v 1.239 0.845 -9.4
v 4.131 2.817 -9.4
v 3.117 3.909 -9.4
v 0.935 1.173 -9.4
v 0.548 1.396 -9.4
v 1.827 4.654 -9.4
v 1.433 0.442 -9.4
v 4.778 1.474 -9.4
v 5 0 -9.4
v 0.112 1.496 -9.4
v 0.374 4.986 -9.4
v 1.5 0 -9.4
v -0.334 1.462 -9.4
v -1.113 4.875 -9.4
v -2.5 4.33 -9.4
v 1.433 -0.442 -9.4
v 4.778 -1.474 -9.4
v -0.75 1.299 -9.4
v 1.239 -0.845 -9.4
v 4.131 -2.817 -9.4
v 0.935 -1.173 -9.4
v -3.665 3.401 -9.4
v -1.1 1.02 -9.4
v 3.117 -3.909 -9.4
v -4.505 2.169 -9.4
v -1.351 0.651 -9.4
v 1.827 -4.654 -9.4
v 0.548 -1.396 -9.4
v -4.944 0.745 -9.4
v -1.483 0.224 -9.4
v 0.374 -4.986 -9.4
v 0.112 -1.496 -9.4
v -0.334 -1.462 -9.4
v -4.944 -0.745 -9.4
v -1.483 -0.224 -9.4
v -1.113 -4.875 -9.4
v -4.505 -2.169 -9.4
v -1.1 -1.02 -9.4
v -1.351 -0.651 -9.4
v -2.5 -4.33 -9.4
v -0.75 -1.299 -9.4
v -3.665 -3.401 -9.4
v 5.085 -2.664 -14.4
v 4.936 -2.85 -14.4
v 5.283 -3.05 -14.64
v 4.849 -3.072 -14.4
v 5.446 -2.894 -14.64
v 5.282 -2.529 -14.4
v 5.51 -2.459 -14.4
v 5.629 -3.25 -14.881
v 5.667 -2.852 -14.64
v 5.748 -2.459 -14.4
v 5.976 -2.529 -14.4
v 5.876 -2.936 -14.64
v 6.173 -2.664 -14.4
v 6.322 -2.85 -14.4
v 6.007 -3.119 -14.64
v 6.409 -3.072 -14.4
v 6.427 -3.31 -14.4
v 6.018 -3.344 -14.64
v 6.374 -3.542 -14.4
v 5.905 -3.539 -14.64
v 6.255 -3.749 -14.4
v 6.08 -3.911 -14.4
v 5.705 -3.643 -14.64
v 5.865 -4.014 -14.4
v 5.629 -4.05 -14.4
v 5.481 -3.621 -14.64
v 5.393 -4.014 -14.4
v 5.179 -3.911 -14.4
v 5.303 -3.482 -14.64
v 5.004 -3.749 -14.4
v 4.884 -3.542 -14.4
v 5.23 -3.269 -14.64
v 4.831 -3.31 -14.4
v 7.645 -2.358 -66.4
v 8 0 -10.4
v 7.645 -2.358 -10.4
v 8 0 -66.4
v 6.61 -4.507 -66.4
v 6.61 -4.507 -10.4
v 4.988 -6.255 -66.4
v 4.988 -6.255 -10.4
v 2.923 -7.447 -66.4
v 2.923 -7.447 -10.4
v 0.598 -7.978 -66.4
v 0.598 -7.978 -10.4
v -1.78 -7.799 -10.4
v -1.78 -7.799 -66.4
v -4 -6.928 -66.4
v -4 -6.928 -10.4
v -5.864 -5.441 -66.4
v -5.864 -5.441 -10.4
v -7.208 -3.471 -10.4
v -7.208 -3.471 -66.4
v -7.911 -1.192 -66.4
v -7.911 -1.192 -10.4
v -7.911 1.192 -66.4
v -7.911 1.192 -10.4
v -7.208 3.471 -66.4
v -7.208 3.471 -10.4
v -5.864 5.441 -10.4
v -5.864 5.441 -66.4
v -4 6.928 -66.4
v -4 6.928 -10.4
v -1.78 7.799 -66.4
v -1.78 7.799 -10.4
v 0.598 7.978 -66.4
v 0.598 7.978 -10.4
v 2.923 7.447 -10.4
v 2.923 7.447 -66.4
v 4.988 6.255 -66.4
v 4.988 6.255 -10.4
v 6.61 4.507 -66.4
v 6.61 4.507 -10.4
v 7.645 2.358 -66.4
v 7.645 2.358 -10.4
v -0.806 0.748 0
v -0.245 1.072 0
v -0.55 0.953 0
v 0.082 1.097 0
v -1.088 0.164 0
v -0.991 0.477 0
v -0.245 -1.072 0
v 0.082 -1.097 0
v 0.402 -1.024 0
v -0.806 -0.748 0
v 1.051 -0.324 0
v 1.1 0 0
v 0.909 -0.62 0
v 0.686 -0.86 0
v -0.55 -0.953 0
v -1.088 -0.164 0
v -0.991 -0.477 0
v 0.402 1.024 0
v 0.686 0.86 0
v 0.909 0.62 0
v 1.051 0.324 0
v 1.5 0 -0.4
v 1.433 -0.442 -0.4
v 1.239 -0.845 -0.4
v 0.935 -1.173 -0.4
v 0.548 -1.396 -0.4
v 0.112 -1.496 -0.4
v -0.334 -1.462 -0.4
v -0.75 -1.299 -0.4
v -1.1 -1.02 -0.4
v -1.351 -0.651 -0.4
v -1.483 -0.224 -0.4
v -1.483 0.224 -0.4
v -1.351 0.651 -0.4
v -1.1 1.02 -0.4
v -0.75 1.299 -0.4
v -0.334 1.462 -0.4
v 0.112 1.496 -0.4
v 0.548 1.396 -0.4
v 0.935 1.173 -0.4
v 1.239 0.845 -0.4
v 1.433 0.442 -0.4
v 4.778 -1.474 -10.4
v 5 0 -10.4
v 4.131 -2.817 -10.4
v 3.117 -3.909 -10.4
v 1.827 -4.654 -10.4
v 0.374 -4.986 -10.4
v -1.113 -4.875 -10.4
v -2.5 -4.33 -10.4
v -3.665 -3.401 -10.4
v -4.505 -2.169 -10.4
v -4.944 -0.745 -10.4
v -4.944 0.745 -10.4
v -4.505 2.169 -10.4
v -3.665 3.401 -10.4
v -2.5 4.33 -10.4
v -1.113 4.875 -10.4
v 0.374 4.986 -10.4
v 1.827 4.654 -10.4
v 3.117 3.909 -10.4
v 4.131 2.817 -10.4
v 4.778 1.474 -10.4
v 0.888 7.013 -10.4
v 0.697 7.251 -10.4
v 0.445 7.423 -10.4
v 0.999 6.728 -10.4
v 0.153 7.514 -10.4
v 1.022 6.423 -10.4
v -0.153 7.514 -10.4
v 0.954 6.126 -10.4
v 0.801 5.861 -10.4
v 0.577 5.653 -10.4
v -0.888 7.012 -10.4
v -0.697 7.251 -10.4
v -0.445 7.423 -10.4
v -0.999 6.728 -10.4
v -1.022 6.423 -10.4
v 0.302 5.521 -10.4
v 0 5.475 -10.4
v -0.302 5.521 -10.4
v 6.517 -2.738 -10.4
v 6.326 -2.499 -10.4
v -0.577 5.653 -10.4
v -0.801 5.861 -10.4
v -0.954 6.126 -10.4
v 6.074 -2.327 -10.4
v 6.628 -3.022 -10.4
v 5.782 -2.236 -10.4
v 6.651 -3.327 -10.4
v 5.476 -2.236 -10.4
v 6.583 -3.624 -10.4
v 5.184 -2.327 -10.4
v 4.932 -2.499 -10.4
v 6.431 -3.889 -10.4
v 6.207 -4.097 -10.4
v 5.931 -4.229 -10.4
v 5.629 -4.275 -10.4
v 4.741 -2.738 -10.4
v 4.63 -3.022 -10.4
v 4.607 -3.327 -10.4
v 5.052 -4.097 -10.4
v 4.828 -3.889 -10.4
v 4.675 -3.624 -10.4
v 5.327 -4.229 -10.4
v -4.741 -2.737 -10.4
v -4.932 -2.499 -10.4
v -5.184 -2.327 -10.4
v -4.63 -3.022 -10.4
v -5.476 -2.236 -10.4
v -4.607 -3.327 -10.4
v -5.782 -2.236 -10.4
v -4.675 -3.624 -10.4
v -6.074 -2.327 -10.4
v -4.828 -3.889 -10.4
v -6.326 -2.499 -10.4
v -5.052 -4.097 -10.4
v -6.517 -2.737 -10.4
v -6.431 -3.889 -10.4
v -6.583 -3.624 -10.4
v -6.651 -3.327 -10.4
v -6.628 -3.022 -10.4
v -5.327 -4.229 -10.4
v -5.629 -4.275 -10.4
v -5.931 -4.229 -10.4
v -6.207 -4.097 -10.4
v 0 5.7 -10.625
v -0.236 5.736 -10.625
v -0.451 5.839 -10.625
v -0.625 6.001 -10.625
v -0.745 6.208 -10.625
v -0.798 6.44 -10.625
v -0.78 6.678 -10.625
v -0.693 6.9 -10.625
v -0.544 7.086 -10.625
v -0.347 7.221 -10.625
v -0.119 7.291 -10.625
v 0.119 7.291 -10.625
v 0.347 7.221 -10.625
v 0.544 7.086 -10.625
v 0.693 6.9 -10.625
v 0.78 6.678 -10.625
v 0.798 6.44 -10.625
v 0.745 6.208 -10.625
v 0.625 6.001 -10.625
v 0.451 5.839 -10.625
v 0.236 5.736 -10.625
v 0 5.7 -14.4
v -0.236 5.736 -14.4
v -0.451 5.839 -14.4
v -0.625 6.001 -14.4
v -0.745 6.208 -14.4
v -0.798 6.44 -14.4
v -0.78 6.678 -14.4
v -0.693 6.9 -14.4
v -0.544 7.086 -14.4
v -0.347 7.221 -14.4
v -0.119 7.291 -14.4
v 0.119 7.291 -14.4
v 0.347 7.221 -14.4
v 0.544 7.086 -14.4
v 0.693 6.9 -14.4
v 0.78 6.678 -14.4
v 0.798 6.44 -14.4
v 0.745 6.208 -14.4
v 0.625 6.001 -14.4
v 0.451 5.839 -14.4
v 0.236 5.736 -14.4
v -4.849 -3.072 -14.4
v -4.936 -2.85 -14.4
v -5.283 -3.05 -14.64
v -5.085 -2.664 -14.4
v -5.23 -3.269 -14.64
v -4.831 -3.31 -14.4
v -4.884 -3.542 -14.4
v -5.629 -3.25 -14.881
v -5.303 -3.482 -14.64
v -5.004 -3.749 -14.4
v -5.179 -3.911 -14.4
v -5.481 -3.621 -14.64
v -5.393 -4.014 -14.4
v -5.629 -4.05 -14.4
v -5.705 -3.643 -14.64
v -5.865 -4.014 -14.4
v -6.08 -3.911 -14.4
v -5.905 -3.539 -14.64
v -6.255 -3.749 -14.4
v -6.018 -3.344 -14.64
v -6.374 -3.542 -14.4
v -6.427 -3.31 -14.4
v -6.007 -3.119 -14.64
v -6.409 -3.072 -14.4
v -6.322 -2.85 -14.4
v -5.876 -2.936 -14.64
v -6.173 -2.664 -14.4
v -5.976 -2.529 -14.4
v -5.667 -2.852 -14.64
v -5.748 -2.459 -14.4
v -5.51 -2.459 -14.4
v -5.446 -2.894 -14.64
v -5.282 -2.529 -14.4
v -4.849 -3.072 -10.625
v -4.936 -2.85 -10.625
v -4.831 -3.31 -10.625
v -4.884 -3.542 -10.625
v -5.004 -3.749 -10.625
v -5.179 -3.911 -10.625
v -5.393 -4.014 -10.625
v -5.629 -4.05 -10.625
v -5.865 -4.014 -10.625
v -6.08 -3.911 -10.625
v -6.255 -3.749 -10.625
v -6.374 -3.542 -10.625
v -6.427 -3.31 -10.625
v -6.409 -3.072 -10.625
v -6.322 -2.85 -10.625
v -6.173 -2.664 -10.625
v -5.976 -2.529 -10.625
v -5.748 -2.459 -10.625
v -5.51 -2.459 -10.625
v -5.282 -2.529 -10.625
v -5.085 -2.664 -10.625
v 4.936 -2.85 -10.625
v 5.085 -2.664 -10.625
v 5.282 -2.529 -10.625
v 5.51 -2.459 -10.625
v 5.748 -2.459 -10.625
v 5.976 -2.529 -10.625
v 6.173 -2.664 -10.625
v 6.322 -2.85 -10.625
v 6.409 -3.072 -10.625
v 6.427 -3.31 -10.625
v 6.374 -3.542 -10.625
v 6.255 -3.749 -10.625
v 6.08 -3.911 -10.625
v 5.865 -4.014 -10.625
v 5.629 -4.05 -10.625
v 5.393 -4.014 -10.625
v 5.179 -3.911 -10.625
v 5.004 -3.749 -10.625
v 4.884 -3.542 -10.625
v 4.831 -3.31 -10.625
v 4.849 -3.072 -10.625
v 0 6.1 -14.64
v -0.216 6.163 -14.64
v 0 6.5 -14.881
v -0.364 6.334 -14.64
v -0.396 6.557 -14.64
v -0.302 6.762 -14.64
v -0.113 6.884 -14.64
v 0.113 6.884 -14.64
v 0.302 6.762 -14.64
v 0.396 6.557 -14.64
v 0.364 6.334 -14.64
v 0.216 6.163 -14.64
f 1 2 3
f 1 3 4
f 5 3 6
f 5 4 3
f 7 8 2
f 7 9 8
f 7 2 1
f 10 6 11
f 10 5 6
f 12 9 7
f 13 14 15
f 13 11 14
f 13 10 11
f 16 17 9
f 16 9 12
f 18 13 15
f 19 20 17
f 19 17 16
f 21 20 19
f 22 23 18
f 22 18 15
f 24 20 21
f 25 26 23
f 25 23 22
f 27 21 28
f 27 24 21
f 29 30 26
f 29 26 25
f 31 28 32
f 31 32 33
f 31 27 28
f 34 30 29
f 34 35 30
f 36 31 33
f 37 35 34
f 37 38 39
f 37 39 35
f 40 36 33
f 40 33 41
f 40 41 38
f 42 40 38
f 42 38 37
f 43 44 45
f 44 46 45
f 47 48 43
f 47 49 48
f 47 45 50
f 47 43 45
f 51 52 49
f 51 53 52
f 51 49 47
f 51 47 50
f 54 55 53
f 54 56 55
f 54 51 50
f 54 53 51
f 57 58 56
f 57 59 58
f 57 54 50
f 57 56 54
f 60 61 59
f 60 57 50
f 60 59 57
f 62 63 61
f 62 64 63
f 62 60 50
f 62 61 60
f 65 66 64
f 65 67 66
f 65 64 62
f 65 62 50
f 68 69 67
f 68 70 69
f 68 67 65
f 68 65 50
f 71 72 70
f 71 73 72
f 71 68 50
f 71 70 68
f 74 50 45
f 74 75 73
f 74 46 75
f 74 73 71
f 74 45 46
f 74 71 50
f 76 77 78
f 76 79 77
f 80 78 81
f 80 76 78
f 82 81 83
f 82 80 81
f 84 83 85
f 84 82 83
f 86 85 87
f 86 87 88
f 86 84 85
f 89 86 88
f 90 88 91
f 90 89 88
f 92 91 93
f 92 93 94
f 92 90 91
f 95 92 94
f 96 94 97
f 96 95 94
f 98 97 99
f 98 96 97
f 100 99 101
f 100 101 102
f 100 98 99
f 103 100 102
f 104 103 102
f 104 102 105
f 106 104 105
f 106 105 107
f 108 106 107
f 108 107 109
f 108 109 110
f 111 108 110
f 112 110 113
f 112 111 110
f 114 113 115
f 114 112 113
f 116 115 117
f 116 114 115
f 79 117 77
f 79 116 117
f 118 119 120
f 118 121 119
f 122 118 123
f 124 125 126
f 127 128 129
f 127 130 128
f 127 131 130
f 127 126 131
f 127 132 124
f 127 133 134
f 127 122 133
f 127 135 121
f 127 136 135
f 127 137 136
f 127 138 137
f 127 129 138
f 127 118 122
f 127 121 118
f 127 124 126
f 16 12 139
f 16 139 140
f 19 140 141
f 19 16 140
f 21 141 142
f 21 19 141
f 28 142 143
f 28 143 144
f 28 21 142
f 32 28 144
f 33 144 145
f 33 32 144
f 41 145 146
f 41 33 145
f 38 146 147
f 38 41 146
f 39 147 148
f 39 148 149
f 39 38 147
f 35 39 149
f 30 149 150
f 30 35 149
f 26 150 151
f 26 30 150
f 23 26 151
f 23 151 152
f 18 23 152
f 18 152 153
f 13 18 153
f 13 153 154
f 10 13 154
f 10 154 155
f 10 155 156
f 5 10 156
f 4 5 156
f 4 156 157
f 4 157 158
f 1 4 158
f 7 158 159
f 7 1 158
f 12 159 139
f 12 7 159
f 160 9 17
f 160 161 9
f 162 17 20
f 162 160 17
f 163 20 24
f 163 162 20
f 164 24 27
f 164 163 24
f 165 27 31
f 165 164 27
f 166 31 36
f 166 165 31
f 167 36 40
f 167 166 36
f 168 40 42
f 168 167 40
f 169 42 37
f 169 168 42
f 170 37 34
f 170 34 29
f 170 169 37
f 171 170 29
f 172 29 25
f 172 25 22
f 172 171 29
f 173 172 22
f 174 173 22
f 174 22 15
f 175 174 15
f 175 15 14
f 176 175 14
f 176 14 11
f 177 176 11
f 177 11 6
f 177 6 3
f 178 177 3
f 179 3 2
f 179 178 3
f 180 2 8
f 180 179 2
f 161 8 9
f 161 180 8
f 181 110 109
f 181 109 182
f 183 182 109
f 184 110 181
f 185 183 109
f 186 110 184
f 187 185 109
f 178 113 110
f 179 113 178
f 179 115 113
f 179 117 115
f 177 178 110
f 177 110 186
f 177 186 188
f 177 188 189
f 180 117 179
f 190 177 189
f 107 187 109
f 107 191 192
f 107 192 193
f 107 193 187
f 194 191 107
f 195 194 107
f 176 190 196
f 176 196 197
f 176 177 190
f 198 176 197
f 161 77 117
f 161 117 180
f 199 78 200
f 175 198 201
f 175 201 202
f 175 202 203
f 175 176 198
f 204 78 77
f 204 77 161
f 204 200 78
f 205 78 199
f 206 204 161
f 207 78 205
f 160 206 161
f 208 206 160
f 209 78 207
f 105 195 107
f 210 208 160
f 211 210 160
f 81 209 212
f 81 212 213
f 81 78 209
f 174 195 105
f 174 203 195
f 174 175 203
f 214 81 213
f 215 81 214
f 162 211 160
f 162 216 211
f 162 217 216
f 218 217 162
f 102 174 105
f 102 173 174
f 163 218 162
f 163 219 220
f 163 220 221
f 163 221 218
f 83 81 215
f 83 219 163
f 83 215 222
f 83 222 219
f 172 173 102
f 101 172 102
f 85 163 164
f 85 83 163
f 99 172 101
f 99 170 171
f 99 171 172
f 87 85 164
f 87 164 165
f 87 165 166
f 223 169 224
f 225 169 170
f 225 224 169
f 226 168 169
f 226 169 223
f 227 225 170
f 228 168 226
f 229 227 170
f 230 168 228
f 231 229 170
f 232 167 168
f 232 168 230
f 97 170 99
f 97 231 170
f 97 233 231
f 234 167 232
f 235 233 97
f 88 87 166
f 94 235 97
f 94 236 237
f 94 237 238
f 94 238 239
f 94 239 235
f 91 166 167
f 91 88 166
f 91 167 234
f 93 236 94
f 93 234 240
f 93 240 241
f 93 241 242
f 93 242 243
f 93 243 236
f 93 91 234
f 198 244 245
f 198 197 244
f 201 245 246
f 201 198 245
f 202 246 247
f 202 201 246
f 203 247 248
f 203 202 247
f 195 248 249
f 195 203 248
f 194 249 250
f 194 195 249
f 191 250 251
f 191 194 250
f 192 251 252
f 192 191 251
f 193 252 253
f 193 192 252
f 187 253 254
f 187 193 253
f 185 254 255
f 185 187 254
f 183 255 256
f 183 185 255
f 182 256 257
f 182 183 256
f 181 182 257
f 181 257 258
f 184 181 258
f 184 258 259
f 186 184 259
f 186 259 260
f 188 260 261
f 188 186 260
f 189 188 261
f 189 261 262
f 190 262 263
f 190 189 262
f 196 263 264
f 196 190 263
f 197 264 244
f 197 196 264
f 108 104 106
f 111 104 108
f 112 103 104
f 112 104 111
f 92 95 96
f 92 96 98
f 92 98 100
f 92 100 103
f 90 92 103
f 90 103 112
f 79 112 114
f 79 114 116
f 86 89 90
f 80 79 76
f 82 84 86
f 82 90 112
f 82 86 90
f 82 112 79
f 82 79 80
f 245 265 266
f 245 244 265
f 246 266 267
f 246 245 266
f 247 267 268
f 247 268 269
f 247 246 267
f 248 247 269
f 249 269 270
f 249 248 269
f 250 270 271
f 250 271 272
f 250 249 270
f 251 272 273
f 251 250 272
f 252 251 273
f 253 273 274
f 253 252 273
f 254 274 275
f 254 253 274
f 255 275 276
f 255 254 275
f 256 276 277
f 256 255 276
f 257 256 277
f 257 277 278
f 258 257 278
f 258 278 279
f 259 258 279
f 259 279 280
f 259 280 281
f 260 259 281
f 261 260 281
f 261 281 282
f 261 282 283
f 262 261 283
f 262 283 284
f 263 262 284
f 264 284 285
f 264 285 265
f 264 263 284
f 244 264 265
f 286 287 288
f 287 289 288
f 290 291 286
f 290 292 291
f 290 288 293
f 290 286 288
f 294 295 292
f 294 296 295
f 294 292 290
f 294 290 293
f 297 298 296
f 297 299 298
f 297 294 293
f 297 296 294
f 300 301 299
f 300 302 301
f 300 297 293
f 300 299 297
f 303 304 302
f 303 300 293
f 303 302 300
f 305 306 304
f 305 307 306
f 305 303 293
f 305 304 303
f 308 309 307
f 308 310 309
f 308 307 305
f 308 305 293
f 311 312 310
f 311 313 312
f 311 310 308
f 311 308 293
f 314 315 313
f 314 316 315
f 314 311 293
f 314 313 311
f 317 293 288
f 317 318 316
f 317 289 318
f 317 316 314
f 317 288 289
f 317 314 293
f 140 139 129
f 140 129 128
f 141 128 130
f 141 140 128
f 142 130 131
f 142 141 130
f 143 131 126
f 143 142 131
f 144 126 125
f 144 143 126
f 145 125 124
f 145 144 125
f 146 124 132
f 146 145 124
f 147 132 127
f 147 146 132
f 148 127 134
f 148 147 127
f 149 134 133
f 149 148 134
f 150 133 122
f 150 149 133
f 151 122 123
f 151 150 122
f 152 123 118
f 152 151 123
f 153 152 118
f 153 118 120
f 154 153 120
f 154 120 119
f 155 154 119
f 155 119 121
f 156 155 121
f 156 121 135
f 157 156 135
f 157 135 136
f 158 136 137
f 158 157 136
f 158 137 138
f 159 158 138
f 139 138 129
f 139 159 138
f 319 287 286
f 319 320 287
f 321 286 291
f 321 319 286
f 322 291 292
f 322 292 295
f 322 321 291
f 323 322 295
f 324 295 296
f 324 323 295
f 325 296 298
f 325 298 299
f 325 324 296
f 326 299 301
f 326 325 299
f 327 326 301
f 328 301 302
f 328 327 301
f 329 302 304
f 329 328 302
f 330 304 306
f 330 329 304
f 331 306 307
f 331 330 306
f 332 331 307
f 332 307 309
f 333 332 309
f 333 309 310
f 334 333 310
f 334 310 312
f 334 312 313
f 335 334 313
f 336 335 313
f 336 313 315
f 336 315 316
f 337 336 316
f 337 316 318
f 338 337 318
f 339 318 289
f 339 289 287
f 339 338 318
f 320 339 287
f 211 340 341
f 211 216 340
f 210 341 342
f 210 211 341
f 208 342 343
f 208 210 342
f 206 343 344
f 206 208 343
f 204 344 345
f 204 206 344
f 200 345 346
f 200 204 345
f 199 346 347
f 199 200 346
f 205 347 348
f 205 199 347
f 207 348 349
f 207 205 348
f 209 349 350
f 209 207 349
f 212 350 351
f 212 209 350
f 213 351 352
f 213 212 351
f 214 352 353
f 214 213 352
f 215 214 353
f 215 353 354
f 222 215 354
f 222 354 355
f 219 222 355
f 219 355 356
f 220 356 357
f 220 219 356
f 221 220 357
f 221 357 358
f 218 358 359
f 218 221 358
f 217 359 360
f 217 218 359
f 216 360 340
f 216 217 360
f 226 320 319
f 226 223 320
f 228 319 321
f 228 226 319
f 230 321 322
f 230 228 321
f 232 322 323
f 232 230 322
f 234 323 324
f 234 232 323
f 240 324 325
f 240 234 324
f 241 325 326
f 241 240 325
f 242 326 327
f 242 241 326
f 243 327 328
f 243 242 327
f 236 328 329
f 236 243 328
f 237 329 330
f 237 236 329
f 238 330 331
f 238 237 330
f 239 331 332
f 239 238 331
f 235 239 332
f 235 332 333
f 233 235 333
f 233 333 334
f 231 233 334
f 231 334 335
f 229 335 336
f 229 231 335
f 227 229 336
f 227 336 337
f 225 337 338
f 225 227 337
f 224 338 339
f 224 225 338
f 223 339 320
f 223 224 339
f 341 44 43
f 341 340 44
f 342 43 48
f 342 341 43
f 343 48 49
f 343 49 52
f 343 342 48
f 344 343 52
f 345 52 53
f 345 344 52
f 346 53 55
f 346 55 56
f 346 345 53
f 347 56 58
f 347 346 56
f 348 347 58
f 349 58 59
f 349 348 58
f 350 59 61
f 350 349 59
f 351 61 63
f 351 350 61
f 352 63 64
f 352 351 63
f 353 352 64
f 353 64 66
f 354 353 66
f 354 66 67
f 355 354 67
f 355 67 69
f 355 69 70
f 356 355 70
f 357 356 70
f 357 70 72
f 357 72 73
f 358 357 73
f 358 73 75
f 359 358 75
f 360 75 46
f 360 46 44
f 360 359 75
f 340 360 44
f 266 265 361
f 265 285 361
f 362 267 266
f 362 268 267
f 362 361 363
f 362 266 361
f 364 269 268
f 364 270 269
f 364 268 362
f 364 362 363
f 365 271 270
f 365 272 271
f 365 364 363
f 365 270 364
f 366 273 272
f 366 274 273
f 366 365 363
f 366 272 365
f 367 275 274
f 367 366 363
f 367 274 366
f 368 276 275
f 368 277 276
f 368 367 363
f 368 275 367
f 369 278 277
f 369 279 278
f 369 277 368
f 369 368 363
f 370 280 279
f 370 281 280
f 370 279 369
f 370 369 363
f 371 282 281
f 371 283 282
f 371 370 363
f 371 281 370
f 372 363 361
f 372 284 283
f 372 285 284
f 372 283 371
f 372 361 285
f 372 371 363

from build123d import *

# Parameters (mm, degrees)
CHAMFER_1_SIZE           = 0.4
PATTERN_CIRCULAR_1_COUNT = 3


with BuildPart() as part:
    # Эскиз1 → Повернуть1 (revolve)
    with BuildSketch(Plane(origin=(0, 0, 0), x_dir=(0, 0, -1), z_dir=(1, 0, 0)), mode=Mode.PRIVATE) as revolve_1_sk:
        Polygon((0, 0), (0, -1.5), (9.4, -1.5), (9.4, -5), (10.4, -5), (10.4, -8), (66.4, -8), (66.4, 0), align=None)
    revolve(revolve_1_sk.sketch.rotate(Axis((0, 0, 0), (0, 0, -1)), 270), axis=Axis((0, 0, 0), (0, 0, -1)))

    # Фаска1
    chamfer_1_edges = [part.edges().sort_by_distance(p)[0] for p in [
        (-1.5, 0, 0),
    ]]
    chamfer(chamfer_1_edges, length=CHAMFER_1_SIZE)

    # Эскиз5 → Отверстие обработанное метчиком M2x0.41 (revolve, cut)
    with BuildSketch(Plane(origin=(0, 6.5, -10.4), x_dir=(0, -1, 0), z_dir=(1, 0, 0))):
        Polygon((0, 0), (0, 4.480688495), (0.8, 4), (0.8, 0.225), (1.025, 0), align=None)
    m2x0_41 = revolve(axis=Axis((0, 6.5, -4.05), (0, 0, -1)), mode=Mode.SUBTRACT)

    # Круговой массив1: Отверстие обработанное метчиком M2x0.41 ×3 about axis
    pattern_circular_1_axis = Axis((0, 0, 0), (0, 0, 1))
    for i in range(1, PATTERN_CIRCULAR_1_COUNT):
        add(m2x0_41.rotate(pattern_circular_1_axis, i * 360 / PATTERN_CIRCULAR_1_COUNT), mode=Mode.SUBTRACT)


solid = part.part
